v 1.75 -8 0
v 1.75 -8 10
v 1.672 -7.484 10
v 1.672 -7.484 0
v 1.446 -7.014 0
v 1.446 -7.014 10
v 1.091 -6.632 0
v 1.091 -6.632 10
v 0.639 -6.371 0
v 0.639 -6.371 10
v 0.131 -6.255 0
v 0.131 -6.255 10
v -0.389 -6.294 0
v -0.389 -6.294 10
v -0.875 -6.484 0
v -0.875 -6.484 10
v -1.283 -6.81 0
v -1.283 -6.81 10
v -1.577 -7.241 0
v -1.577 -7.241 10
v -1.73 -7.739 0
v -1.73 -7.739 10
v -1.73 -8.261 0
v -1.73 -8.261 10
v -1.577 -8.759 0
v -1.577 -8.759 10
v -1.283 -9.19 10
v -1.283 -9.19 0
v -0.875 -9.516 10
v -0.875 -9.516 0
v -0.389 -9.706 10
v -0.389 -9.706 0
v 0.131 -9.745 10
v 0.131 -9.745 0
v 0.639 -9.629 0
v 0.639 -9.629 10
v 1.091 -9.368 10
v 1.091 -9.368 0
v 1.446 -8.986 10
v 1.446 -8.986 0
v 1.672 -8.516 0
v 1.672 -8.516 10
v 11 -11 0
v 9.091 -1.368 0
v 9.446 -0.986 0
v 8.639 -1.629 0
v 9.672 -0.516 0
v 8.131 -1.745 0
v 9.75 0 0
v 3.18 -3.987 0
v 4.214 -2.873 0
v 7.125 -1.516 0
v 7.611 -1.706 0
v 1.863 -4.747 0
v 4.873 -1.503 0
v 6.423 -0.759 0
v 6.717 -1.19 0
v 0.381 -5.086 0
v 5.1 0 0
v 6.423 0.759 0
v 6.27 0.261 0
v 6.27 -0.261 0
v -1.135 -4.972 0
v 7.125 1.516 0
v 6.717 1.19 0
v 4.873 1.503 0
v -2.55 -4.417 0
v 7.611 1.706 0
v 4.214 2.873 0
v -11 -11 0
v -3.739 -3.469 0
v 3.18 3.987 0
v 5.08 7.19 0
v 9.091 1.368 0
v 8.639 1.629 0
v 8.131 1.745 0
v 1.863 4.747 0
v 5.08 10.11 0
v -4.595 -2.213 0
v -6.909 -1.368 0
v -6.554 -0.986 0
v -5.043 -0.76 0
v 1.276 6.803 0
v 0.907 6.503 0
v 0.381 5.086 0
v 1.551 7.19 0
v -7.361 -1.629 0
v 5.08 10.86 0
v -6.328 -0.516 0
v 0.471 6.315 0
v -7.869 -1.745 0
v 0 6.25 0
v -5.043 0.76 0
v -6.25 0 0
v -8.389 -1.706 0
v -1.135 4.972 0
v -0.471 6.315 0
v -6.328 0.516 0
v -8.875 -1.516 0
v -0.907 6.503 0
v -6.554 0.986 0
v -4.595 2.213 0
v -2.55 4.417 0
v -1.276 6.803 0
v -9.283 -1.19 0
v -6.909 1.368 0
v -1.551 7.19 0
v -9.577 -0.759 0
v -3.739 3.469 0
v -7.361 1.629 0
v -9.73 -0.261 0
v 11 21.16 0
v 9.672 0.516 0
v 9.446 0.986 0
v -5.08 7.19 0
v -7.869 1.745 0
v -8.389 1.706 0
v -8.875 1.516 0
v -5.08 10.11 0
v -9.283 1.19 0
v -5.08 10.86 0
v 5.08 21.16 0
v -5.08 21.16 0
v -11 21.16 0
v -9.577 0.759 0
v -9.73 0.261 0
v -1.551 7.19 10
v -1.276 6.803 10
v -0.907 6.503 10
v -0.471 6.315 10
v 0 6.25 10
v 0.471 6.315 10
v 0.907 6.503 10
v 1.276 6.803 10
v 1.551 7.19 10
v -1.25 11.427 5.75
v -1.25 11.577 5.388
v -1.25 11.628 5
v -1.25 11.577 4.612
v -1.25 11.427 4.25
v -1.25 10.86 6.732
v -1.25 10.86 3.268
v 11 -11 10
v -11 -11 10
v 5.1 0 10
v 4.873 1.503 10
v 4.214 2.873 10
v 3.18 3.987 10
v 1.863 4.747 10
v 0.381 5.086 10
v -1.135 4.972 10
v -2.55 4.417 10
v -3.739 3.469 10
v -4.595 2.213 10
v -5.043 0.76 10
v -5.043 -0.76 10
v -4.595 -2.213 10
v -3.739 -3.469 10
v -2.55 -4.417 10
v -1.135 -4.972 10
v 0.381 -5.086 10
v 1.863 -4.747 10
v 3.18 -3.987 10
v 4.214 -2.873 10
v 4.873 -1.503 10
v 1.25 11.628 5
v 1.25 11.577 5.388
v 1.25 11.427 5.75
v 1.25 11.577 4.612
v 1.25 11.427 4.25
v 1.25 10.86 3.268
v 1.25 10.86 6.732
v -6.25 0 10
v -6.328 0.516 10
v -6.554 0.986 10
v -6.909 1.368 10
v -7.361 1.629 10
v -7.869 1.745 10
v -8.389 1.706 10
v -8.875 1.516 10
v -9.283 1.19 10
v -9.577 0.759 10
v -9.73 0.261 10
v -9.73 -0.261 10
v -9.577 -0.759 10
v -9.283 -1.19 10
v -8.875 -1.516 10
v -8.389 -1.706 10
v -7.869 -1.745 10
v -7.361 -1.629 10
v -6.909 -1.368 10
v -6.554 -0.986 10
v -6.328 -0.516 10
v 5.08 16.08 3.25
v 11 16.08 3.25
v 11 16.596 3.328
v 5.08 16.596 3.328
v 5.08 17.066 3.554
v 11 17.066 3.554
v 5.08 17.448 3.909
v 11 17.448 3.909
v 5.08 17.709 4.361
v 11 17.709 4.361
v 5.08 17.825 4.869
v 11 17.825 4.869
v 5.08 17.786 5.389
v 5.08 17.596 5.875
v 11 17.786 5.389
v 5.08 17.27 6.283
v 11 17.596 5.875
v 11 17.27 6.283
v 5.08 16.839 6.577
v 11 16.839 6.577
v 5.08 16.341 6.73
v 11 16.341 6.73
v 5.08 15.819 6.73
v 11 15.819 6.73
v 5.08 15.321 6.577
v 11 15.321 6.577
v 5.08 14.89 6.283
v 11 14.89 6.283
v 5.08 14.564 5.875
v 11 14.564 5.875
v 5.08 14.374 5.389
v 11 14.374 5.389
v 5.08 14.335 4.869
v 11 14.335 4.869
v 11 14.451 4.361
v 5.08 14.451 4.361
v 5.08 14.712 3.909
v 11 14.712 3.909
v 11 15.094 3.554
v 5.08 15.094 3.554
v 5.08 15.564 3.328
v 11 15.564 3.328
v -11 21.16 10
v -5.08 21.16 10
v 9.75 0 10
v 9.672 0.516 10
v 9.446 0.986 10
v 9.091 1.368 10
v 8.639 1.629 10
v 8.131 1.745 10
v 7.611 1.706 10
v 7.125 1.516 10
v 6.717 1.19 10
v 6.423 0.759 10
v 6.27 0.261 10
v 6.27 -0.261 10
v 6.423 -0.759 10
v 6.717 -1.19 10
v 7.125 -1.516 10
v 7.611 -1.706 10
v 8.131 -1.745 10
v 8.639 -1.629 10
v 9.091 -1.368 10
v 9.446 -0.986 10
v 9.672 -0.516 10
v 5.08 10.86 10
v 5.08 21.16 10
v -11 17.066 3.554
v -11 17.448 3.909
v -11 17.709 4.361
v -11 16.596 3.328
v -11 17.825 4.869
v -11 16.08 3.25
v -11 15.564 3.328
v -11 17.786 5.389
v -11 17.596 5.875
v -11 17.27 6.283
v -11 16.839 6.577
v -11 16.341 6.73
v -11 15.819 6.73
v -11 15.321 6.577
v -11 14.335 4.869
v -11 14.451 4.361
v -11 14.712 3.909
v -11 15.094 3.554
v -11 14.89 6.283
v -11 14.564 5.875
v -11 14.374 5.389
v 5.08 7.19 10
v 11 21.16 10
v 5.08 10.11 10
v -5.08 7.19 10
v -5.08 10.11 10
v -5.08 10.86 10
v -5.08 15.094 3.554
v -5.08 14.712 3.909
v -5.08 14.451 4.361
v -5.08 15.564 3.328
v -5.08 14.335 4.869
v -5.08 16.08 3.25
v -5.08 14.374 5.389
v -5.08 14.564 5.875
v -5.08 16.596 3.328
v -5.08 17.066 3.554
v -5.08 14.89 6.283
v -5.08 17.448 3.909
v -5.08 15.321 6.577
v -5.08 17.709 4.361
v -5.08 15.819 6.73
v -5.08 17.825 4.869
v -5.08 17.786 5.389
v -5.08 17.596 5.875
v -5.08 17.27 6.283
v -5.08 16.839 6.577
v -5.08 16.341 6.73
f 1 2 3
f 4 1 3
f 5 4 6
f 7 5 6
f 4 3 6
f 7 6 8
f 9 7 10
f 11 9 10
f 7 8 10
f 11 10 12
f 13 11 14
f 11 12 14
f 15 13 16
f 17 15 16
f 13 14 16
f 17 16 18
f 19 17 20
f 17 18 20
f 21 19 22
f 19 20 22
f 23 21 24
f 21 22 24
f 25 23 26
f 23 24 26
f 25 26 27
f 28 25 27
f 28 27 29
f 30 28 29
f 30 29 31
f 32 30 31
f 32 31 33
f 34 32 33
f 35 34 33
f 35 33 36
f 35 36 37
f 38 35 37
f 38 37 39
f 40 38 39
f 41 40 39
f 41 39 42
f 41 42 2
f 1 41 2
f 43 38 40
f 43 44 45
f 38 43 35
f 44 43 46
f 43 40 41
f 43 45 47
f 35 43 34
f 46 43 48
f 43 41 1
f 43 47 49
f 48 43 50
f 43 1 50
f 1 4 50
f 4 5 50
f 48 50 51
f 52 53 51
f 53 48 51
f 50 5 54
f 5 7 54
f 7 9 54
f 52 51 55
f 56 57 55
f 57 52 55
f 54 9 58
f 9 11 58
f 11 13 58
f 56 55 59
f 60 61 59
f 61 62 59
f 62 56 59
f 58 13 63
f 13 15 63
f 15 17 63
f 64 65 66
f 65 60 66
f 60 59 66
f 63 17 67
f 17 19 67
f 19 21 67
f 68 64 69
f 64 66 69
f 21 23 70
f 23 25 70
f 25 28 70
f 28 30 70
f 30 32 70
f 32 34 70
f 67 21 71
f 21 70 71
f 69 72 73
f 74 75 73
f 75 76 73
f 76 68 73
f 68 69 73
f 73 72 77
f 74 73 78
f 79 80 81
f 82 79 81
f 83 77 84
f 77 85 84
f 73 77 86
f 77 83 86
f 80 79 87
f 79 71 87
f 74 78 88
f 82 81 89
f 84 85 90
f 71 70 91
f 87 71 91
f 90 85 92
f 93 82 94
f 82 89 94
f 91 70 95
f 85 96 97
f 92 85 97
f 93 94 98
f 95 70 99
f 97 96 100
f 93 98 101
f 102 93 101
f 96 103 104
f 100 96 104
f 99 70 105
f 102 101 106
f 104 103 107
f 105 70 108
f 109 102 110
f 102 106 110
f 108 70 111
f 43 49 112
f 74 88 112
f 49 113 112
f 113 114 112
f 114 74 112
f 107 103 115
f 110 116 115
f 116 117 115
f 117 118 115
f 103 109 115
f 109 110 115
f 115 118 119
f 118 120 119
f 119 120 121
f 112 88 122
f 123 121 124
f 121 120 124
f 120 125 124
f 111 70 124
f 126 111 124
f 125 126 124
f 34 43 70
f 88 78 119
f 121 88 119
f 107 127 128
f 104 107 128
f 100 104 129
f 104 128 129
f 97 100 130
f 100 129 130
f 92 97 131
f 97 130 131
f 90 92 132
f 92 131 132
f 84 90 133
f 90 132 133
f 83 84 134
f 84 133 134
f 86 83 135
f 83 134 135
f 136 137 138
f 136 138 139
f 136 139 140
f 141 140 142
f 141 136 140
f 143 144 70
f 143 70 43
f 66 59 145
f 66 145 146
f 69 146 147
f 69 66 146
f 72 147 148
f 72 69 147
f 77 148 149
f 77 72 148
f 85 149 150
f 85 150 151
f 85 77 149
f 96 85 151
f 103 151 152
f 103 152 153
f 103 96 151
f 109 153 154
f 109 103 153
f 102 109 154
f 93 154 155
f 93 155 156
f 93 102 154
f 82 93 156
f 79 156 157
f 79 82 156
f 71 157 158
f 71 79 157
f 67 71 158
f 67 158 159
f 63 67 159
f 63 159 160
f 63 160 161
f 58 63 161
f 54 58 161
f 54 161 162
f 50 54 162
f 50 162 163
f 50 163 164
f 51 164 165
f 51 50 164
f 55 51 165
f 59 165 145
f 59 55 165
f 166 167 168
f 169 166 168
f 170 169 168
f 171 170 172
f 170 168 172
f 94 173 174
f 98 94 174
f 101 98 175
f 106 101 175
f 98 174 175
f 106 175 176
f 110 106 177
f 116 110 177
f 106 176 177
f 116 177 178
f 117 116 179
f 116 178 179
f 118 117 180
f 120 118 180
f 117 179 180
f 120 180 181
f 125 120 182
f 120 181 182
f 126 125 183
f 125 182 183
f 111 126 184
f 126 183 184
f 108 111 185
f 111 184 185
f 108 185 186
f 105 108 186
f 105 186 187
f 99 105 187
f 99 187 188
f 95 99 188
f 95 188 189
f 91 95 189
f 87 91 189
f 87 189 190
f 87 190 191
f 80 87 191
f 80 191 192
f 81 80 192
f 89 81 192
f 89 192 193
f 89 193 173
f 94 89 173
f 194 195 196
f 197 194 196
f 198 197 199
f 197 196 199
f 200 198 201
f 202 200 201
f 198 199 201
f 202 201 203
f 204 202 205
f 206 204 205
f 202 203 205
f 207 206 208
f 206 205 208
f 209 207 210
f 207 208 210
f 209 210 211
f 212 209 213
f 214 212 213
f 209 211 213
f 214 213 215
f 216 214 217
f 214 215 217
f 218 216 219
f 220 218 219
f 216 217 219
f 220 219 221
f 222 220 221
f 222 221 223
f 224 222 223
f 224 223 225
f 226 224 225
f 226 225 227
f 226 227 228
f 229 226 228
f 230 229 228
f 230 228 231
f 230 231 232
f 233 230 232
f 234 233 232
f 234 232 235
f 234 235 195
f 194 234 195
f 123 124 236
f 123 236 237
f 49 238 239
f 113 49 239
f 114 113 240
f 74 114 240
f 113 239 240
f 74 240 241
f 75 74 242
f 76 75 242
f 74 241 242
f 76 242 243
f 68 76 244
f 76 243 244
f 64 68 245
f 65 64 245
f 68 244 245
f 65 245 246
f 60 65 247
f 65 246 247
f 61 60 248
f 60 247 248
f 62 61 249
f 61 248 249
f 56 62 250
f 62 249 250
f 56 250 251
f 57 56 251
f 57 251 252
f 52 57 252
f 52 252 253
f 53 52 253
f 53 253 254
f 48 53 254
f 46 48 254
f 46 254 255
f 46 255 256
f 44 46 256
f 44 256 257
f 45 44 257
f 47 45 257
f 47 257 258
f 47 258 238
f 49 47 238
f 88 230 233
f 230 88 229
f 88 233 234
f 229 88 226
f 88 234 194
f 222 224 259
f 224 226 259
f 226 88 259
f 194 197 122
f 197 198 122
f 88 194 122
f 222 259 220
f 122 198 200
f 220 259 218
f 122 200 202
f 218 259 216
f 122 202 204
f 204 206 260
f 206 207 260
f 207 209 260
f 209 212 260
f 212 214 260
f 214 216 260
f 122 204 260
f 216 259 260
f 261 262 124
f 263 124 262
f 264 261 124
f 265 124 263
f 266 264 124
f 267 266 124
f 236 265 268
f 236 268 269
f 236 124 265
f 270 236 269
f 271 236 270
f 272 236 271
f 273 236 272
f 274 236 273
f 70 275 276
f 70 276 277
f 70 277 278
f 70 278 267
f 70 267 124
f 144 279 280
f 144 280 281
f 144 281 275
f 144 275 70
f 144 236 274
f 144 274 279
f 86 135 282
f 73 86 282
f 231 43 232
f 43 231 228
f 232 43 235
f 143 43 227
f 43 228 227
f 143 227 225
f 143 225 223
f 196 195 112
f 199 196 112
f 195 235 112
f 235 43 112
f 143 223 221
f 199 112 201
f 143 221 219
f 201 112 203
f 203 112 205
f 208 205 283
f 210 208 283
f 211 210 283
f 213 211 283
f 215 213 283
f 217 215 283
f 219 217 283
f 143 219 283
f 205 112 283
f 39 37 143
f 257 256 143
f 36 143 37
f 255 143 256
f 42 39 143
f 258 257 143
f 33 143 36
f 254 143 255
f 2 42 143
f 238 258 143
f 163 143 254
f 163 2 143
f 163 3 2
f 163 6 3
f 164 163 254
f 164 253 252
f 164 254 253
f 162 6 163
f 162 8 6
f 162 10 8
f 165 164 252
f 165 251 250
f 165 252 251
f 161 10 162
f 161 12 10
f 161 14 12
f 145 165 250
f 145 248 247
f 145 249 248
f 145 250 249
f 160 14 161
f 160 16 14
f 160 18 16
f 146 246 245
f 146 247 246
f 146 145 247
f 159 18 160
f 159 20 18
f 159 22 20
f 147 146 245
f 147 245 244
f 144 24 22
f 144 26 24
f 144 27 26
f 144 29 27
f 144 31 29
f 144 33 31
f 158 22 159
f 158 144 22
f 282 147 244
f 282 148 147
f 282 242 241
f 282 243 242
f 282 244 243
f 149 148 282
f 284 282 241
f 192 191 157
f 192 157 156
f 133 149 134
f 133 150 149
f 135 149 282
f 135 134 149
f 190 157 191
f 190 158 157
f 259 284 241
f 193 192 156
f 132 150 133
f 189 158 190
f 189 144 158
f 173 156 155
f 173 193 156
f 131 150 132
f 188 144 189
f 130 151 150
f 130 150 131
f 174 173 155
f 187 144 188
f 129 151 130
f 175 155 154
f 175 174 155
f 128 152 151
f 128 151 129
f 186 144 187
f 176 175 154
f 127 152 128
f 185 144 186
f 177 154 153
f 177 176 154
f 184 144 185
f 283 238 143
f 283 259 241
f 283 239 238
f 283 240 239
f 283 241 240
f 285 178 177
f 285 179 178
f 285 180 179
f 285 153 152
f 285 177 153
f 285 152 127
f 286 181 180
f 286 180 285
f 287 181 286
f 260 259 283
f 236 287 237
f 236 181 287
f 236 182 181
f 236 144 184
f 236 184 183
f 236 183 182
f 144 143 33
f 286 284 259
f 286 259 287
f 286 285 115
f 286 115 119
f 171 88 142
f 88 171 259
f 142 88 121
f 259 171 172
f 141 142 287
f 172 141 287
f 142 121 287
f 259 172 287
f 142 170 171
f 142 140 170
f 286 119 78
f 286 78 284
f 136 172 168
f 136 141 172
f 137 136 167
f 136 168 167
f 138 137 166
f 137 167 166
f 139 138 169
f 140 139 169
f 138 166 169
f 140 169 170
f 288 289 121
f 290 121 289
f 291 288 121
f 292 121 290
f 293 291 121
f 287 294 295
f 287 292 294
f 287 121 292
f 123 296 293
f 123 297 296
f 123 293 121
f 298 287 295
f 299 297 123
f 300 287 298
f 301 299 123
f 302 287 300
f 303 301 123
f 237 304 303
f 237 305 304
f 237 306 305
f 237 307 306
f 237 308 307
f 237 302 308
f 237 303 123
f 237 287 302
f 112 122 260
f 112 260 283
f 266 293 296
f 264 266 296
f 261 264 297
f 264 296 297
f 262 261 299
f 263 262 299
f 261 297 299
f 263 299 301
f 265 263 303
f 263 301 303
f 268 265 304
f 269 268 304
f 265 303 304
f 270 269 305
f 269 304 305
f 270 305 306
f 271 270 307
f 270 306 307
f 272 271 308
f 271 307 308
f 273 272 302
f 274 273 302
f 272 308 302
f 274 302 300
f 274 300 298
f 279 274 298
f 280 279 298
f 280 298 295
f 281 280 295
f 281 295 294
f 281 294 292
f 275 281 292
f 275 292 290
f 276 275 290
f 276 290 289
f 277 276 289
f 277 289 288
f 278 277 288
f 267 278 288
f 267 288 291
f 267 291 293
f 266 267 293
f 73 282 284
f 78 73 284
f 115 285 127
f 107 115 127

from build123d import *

# Parameters (mm, degrees)
SKETCH1_R                       = 11
SKETCH1_R_2                     = 5.1
BOSS_EXTRUDE1_DEPTH             = 10
SKETCH2_R                       = 1.75
CUT_EXTRUDE1_DEPTH              = 19.493242009
BOSS_EXTRUDE2_START             = 11
SKETCH3_W                       = 22
SKETCH3_H                       = 10
BOSS_EXTRUDE2_DEPTH             = 10.16
BOSS_EXTRUDE3_REACH             = 28.552
SKETCH5_W                       = 22
SKETCH5_H                       = 10
SKETCH6_W                       = 10.16
SKETCH6_H                       = 13.97
CUT_EXTRUDE2_DEPTH              = 26.860116009
SKETCH7_R                       = 1.75
CUT_EXTRUDE3_DEPTH              = 33.120797001
BOSS_EXTRUDE4_DEPTH             = 10
BOSS_EXTRUDE5_REACH             = 27.86
SKETCH9_W                       = 10
SKETCH9_H                       = 0.75
BOSS_EXTRUDE5_DIRECTION_2_REACH = 27.86
BOSS_EXTRUDE6_DEPTH             = 1.25
FILLET1_R                       = 1.5


with BuildPart() as part:
    # Sketch1 → Boss-Extrude1 (new body)
    with BuildSketch(Plane.XY):
        Circle(SKETCH1_R)
        Circle(SKETCH1_R_2, mode=Mode.SUBTRACT)
    extrude(amount=BOSS_EXTRUDE1_DEPTH)

    # Sketch2 → Cut-Extrude1 (cut, through all)
    with BuildSketch(Plane.XY.offset(10)):
        with Locations((0, 8)):
            Circle(SKETCH2_R)
        with Locations((8, 0)):
            Circle(SKETCH2_R)
        with Locations((0, -8)):
            Circle(SKETCH2_R)
        with Locations((-8, 0)):
            Circle(SKETCH2_R)
    extrude(amount=-CUT_EXTRUDE1_DEPTH, mode=Mode.SUBTRACT)

    # Sketch5 → Boss-Extrude3 (add, up to next)
    with BuildSketch(Plane.XZ.offset(-11), mode=Mode.PRIVATE) as boss_extrude3_sk1:
        with Locations((0, 5)):
            Rectangle(SKETCH5_W, SKETCH5_H)
    boss_extrude3_tool1 = extrude(boss_extrude3_sk1.sketch, amount=BOSS_EXTRUDE3_REACH, mode=Mode.PRIVATE) - part.part


with BuildPart() as body_2:
    # Sketch3 → Boss-Extrude2 (new body)
    with BuildSketch(Plane(origin=(0, 0, 0), x_dir=(1, 0, 0), z_dir=(0, 1, 0)).offset(BOSS_EXTRUDE2_START)):
        with Locations((0, -5)):
            Rectangle(SKETCH3_W, SKETCH3_H)
    extrude(amount=BOSS_EXTRUDE2_DEPTH)


with BuildPart() as part_1:
    add(part.part)

    add(body_2.part)  # Boss-Extrude3 merges body 2
    add(boss_extrude3_tool1.solids().sort_by_distance((0, 11, 5))[0])
    add(boss_extrude3_tool1.solids().sort_by_distance((0, 11, 5))[1])

    # Sketch6 → Cut-Extrude2 (cut, through all)
    with BuildSketch(Plane.XY.offset(10)):
        with Locations((0, 14.175)):
            Rectangle(SKETCH6_W, SKETCH6_H)
    extrude(amount=-CUT_EXTRUDE2_DEPTH, mode=Mode.SUBTRACT)

    # Sketch7 → Cut-Extrude3 (cut, through all)
    with BuildSketch(Plane(origin=(11, 0, 0), x_dir=(0, 0, -1), z_dir=(1, 0, 0))):
        with Locations((-5, 16.08)):
            Circle(SKETCH7_R)
    extrude(amount=-CUT_EXTRUDE3_DEPTH, mode=Mode.SUBTRACT)

    # Sketch8 → Boss-Extrude4 (add, through all)
    with BuildSketch(Plane.XY.offset(10)):
        with BuildLine():
            Line((-11, 0), (-11, -11))
            Line((-11, -11), (-4.5e-08, -11))
            ThreePointArc((-4.5e-08, -11), (-7.778174609, -7.778174577), (-11, 0))
        make_face()
        with BuildLine():
            ThreePointArc((11, 0), (7.778174577, -7.778174609), (-4.5e-08, -11))
            Line((-4.5e-08, -11), (11, -11))
            Line((11, -11), (11, 0))
        make_face()
    extrude(amount=-BOSS_EXTRUDE4_DEPTH)

    # Sketch9 → Boss-Extrude5 (add, up to next)
    with BuildSketch(Plane.ZY, mode=Mode.PRIVATE) as boss_extrude5_sk1:
        with Locations((5, 10.485)):
            Rectangle(SKETCH9_W, SKETCH9_H)
    boss_extrude5_tool1 = extrude(boss_extrude5_sk1.sketch, amount=BOSS_EXTRUDE5_REACH, mode=Mode.PRIVATE) - part_1.part
    add(boss_extrude5_tool1.solids().sort_by_distance((0, 10.485, 5))[0])

    # Sketch9 → Boss-Extrude5 direction 2 (add, up to next)
    with BuildSketch(Plane.ZY, mode=Mode.PRIVATE) as boss_extrude5_direction_2_sk1:
        with Locations((5, 10.485)):
            Rectangle(SKETCH9_W, SKETCH9_H)
    boss_extrude5_direction_2_tool1 = extrude(boss_extrude5_direction_2_sk1.sketch, amount=-BOSS_EXTRUDE5_DIRECTION_2_REACH, mode=Mode.PRIVATE) - part_1.part
    add(boss_extrude5_direction_2_tool1.solids().sort_by_distance((0, 10.485, 5))[0])

    # Sketch10 → Boss-Extrude6 (add, symmetric)
    with BuildSketch(Plane.ZY):
        Polygon((5, 11.86), (3.267949192, 10.86), (6.732050808, 10.86), align=None)
    extrude(amount=BOSS_EXTRUDE6_DEPTH, both=True)

    # Fillet1
    fillet1_edges = [part_1.edges().sort_by_distance(p)[0] for p in [
        (0, 11.86, 5),
    ]]
    fillet(fillet1_edges, radius=FILLET1_R)


solid = part_1.part
